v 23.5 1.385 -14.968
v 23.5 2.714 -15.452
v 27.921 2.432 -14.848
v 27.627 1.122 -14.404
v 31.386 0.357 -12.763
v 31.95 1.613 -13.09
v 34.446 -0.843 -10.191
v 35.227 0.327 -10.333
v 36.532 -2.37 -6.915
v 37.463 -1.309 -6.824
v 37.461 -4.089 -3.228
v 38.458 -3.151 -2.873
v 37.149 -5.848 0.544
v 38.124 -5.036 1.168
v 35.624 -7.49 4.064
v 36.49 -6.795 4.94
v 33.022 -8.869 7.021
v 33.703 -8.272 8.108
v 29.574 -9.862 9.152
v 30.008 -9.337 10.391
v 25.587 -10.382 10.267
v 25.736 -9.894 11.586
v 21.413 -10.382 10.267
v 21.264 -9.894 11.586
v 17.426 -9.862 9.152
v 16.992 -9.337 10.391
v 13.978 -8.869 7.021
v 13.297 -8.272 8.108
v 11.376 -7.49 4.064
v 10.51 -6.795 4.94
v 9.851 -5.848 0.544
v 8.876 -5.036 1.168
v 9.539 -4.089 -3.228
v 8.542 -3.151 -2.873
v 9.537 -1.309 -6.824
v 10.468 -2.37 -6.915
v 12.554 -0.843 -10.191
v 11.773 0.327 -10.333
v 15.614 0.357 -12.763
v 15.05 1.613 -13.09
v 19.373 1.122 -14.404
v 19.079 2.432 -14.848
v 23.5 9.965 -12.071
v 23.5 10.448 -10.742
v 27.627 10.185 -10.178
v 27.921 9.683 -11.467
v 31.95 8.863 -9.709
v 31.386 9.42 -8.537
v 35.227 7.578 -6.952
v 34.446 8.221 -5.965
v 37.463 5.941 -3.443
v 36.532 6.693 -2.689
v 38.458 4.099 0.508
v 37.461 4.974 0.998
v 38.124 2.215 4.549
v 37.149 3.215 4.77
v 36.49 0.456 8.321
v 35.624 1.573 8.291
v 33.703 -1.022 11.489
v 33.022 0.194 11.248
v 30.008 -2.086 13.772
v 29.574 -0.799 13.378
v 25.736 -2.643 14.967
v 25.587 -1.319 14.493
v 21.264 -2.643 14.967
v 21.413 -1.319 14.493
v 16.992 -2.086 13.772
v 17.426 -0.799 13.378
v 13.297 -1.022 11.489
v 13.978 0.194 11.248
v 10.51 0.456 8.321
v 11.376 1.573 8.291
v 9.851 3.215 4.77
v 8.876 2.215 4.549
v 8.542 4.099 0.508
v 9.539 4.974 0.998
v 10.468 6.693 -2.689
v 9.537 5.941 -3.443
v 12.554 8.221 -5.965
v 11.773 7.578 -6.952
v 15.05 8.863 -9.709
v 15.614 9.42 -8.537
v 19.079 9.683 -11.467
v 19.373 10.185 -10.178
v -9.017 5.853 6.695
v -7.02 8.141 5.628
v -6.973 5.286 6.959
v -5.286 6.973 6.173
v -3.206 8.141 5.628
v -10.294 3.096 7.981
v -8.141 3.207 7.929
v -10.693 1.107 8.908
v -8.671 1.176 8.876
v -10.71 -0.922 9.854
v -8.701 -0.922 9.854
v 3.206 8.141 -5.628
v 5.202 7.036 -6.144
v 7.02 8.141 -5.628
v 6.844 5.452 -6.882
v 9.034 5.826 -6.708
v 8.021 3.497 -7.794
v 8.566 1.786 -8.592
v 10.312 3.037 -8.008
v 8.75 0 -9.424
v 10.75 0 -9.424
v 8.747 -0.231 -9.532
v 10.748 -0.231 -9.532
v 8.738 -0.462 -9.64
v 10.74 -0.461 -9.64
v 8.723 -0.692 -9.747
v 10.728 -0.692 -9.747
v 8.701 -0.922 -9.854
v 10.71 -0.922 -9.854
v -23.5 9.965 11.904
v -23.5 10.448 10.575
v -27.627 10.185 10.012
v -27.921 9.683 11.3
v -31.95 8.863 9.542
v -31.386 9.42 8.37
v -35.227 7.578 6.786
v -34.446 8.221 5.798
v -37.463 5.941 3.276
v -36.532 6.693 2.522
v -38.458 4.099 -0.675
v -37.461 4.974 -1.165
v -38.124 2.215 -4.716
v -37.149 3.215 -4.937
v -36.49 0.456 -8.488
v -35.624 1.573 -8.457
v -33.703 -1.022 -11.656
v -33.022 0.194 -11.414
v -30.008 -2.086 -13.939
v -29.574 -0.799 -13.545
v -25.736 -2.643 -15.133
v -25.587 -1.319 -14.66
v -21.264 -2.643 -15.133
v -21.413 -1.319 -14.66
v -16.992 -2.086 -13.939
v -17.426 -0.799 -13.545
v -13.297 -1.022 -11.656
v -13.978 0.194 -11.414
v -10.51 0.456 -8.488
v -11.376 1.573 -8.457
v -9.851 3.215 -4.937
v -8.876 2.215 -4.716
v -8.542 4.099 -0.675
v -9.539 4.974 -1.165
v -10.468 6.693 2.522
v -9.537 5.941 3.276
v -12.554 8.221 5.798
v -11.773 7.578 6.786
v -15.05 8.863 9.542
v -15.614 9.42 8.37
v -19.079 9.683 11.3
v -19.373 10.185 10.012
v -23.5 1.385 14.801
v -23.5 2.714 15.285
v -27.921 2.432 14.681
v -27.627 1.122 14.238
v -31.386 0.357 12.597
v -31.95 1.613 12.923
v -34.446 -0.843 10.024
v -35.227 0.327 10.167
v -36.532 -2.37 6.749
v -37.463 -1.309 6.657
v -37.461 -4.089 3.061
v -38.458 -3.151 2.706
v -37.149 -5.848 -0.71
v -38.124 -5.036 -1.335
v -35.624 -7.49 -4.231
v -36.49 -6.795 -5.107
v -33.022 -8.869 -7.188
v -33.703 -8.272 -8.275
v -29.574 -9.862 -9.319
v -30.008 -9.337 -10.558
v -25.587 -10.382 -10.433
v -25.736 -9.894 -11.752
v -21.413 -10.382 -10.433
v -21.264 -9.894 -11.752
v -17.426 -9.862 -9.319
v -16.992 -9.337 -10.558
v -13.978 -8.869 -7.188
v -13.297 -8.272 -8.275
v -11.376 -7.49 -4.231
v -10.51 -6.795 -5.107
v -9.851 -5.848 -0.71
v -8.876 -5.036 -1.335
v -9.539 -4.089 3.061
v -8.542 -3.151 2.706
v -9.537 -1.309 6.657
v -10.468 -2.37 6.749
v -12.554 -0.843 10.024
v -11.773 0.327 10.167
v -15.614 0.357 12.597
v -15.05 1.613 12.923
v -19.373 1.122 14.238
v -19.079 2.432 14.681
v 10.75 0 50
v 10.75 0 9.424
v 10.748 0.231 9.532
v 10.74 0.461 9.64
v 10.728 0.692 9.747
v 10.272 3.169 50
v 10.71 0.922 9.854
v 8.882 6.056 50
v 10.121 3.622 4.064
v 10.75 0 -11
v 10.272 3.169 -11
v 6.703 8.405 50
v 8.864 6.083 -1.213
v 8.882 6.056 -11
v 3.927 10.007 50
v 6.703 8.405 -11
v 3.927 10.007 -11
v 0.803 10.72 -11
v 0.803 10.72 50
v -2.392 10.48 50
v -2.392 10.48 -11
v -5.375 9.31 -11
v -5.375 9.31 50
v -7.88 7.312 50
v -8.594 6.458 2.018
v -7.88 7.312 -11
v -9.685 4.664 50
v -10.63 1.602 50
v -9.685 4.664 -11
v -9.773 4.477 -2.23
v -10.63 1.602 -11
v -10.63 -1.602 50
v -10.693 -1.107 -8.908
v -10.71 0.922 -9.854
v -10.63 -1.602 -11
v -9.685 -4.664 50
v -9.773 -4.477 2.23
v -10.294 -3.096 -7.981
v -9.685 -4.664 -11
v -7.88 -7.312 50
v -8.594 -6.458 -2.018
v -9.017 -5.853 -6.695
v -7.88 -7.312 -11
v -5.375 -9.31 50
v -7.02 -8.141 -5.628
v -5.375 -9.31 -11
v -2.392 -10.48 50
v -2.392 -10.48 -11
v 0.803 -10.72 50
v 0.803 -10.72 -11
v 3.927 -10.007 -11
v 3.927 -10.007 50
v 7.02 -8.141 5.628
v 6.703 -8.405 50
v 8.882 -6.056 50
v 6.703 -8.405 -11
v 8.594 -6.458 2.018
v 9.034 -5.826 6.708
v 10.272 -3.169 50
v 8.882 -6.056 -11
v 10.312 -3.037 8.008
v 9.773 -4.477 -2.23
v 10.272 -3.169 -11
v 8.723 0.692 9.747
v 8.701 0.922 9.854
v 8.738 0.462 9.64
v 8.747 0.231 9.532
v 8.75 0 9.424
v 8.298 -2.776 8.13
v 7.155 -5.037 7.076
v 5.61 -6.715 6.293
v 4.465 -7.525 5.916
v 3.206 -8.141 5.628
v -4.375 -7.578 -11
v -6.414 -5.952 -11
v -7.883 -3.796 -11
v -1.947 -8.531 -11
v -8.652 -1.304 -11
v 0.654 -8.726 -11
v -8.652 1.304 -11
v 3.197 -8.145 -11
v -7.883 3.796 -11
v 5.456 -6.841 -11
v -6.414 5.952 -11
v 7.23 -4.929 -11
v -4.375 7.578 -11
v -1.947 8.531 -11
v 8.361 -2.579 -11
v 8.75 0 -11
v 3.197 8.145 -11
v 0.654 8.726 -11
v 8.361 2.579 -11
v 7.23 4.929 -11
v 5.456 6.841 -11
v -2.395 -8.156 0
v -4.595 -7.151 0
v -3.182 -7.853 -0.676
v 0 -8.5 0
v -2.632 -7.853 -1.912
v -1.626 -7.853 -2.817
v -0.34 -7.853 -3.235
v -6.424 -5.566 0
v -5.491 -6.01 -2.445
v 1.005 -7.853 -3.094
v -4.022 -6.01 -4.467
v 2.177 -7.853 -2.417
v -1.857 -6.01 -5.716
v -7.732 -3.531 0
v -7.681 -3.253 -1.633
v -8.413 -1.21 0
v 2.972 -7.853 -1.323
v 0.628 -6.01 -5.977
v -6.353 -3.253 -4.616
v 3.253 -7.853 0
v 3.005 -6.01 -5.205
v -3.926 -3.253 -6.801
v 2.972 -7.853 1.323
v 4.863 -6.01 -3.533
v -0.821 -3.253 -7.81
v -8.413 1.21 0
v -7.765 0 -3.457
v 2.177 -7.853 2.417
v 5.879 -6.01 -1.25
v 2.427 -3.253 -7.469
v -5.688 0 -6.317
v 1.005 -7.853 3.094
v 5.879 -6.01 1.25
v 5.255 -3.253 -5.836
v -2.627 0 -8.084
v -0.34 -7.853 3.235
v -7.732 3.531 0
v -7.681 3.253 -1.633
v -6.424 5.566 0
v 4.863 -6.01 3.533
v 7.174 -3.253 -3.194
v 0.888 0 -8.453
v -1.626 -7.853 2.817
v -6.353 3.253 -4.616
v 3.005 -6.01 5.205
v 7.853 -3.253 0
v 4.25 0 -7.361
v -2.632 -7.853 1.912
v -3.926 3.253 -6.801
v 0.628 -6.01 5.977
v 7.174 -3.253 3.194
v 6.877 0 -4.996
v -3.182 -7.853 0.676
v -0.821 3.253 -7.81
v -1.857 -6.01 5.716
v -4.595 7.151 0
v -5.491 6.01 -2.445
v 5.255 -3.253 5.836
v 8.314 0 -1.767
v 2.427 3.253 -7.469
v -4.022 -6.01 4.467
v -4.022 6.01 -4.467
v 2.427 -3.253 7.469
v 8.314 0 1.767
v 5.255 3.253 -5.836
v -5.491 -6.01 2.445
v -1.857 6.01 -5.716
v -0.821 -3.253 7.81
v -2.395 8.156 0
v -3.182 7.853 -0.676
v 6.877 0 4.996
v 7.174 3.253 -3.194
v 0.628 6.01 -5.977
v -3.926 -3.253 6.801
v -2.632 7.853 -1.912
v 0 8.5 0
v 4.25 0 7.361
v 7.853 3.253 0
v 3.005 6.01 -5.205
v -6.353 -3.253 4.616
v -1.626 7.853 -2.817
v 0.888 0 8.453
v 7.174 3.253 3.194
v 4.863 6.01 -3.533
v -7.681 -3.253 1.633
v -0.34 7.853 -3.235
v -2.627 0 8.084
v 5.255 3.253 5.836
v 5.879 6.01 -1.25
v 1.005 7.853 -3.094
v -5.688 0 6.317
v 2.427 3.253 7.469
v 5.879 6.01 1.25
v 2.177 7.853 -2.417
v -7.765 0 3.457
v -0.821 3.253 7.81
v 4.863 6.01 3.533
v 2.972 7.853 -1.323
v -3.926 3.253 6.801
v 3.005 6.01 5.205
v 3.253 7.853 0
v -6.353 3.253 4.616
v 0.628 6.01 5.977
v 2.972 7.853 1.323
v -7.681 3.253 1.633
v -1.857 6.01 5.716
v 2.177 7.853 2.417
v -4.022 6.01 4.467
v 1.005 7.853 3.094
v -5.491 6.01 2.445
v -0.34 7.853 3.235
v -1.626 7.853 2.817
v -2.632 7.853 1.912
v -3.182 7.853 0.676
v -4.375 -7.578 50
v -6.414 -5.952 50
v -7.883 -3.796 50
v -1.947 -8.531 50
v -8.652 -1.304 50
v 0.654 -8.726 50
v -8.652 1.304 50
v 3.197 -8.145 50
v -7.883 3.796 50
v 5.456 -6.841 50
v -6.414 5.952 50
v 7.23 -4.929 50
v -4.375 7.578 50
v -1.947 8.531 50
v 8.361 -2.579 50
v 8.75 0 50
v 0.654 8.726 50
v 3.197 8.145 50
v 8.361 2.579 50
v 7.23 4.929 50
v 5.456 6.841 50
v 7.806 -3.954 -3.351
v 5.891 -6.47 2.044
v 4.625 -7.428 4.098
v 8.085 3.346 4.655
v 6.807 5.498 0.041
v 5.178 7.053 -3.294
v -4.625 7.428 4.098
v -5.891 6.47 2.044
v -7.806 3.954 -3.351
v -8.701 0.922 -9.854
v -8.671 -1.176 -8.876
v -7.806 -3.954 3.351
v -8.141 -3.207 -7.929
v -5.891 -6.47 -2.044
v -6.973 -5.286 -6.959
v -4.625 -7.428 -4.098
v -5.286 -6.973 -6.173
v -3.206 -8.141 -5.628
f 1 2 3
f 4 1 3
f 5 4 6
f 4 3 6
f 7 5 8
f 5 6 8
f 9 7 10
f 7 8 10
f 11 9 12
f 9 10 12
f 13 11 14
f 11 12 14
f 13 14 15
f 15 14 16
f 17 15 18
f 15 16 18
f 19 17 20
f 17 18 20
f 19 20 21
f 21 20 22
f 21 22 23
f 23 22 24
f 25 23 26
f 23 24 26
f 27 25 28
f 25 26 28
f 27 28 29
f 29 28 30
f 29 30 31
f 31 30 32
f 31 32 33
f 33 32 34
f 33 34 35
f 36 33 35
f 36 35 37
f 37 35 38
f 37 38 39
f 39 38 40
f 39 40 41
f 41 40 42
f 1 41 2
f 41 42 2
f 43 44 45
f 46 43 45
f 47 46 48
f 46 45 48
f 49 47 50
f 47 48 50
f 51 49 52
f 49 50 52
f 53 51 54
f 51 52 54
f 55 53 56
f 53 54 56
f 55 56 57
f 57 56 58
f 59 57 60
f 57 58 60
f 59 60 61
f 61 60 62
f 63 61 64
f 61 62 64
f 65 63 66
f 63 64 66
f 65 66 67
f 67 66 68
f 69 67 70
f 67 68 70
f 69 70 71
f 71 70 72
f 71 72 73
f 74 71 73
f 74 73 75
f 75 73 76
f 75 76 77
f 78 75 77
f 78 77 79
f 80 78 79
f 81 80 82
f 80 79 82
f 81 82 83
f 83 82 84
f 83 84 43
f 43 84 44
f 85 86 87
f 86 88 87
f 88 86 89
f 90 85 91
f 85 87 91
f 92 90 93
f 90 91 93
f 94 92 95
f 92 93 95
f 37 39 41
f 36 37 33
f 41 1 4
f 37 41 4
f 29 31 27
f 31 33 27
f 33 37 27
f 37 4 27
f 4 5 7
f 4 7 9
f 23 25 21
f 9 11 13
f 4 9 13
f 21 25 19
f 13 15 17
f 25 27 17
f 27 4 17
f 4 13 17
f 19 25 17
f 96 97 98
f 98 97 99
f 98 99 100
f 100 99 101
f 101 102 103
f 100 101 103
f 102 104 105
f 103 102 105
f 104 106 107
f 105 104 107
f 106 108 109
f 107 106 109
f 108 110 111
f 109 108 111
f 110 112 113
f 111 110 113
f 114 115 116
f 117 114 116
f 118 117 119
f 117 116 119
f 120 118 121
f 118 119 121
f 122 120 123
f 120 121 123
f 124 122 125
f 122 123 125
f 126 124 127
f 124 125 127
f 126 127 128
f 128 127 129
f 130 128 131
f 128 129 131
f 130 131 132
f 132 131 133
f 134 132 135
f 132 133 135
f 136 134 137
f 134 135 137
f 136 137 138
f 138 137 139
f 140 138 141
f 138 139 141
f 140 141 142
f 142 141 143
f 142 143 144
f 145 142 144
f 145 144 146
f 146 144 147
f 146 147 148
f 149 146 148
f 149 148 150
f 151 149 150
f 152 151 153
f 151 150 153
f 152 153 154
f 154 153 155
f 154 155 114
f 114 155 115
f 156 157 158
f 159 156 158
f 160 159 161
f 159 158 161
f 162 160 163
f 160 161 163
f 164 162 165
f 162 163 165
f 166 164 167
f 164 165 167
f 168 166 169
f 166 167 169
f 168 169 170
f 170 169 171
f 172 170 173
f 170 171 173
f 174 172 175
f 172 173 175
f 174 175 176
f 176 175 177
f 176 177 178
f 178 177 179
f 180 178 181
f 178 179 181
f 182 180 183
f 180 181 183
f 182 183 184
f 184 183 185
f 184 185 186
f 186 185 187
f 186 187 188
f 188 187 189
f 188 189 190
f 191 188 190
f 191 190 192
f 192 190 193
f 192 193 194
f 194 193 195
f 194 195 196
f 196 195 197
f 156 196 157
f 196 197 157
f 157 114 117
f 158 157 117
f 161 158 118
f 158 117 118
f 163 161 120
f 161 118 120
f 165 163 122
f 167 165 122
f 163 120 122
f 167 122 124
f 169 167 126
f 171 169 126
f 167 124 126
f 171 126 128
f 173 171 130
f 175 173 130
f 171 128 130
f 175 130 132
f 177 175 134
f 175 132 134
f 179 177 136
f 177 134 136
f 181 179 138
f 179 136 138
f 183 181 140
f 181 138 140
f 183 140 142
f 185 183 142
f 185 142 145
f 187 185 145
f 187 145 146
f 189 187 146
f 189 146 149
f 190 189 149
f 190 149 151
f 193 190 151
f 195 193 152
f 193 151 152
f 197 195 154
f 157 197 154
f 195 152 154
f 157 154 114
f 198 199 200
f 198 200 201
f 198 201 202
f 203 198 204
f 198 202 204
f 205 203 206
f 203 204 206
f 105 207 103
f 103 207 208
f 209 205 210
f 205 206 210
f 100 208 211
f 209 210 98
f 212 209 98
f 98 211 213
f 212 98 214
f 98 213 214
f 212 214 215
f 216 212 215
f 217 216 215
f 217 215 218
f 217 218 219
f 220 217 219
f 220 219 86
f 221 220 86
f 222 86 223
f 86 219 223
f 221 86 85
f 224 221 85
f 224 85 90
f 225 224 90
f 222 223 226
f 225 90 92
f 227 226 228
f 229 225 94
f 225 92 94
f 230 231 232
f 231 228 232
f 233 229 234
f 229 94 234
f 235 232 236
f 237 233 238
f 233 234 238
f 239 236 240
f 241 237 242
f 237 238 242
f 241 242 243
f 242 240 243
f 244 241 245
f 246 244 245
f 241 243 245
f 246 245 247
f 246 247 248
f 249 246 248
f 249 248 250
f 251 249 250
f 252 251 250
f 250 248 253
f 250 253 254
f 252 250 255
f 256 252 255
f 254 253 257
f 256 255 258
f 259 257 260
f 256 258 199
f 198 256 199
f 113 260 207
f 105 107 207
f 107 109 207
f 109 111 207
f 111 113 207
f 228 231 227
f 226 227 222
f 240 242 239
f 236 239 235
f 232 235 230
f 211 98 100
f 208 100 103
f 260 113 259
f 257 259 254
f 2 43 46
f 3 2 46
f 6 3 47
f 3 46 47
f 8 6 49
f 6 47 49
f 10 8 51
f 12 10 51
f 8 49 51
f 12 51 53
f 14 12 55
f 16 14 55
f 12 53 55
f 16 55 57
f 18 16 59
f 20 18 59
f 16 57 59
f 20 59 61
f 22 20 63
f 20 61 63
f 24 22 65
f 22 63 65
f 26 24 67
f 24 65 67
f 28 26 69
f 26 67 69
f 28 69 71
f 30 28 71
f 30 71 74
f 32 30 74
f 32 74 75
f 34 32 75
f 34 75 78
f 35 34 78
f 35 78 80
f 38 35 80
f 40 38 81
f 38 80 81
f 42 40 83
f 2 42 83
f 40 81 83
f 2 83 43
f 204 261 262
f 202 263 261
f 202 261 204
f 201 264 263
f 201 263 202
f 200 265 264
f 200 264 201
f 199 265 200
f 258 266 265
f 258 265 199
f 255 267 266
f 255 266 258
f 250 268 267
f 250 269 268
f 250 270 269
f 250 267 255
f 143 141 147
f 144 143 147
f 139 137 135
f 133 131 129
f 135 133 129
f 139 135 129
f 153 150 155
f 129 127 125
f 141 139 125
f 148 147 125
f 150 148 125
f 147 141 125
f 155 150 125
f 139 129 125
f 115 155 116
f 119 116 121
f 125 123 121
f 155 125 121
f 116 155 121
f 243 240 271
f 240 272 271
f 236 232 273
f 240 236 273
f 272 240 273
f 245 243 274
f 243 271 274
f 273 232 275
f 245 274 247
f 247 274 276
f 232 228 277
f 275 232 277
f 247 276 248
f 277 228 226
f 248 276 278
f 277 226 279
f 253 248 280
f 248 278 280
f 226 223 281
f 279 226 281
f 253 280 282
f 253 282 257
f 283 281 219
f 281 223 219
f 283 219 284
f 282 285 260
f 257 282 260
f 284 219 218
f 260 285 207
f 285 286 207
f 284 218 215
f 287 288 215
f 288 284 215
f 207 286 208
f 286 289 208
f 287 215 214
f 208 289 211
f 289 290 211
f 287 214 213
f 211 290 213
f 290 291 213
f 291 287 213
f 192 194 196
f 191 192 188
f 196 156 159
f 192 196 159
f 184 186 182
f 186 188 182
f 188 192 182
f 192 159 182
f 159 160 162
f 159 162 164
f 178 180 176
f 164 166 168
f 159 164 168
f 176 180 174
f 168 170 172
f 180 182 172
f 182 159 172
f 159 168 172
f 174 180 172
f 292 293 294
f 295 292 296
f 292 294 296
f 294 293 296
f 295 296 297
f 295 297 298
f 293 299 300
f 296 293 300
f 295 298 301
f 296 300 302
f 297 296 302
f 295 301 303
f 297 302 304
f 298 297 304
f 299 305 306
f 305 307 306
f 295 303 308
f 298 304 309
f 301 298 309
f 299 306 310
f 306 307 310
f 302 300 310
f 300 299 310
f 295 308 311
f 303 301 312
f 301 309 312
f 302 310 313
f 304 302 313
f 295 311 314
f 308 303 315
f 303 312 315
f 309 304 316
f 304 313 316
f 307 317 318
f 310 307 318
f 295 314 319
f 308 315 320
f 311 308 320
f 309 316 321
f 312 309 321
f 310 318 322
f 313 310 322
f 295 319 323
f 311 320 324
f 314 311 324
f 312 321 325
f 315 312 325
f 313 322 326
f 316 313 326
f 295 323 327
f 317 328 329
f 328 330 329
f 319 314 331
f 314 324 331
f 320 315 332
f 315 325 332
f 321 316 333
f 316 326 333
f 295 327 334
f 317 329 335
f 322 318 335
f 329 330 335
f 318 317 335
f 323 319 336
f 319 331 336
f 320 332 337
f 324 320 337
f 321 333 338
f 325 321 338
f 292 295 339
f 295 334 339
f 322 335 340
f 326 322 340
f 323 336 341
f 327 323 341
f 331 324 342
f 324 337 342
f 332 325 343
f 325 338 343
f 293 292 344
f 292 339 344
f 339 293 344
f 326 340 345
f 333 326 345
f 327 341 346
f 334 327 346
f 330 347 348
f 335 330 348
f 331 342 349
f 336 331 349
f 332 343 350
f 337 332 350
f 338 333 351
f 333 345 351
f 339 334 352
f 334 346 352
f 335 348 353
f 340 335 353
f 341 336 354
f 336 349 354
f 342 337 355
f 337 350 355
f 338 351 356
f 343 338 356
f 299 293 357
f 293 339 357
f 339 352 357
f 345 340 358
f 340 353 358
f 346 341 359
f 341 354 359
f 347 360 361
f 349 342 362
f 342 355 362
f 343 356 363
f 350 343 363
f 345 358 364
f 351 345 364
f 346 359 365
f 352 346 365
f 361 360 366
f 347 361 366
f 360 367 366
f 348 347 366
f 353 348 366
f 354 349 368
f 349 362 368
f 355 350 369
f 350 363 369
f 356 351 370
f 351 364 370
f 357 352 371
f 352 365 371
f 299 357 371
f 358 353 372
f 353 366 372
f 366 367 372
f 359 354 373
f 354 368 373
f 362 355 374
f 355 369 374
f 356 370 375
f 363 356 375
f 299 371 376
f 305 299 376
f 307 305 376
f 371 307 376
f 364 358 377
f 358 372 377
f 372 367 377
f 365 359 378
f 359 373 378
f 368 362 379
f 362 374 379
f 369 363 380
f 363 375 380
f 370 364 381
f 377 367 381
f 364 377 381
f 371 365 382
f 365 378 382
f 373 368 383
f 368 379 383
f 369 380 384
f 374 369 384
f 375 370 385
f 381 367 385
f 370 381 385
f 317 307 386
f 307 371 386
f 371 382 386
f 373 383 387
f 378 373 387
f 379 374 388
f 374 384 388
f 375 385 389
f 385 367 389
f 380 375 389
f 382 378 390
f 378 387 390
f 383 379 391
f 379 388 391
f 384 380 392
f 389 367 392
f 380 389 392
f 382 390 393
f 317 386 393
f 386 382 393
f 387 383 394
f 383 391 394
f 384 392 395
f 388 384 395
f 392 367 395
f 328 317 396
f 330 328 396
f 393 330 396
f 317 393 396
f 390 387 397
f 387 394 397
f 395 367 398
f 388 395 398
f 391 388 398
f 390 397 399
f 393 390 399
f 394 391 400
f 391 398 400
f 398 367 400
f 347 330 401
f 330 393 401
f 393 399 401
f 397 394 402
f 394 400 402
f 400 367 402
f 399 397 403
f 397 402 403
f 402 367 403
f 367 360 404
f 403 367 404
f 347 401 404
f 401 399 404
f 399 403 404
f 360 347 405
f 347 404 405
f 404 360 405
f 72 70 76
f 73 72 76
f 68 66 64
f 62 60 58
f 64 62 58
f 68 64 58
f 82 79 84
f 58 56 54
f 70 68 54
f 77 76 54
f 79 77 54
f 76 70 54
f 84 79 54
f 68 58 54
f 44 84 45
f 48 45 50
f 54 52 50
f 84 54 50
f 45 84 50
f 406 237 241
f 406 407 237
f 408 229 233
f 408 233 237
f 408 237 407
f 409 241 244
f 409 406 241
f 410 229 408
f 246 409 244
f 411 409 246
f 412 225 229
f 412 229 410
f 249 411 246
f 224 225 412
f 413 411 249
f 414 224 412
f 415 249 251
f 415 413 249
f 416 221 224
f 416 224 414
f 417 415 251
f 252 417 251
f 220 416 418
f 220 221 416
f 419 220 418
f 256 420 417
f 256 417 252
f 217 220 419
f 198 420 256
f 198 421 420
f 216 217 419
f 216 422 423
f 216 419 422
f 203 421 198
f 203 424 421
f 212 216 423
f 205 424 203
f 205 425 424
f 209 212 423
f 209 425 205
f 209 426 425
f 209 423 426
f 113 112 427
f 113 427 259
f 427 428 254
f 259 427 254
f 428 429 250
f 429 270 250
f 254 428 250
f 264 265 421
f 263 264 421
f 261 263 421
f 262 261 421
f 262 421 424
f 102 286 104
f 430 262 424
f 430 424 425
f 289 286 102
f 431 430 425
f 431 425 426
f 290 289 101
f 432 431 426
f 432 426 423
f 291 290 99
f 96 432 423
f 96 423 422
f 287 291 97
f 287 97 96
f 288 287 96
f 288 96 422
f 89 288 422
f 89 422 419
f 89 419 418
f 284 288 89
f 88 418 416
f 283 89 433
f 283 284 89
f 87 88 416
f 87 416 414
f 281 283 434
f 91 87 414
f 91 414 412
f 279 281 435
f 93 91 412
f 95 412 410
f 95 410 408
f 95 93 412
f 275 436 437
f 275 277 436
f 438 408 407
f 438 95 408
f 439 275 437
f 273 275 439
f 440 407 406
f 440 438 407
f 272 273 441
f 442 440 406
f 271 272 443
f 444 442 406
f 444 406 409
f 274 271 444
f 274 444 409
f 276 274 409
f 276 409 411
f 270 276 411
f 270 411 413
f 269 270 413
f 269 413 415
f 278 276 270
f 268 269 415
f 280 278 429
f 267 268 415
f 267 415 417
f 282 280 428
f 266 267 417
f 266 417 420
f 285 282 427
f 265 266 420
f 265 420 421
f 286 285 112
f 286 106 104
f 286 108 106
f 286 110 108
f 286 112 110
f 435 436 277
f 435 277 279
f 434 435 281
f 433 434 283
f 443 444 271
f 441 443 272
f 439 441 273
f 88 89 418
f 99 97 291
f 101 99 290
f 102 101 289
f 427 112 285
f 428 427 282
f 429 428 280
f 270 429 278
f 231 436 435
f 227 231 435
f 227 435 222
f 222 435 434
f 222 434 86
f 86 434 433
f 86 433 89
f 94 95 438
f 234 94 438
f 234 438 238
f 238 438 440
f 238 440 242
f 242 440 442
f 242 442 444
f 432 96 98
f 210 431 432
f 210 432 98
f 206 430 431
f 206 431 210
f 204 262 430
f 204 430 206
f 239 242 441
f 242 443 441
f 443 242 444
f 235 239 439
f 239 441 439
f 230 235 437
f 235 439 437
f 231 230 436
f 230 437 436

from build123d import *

# Parameters (mm, degrees)
CHAMFER1_SIZE            = 1
CIRPATTERN1_COUNT        = 2
BOSS_EXTRUDE2_DEPTH      = 50
BOSS_EXTRUDE2_DEPTH_BACK = 11
SKETCH9_R                = 10.75
SKETCH9_R_2              = 8.75
CUT_EXTRUDE1_DEPTH       = 11
CIRPATTERN2_START        = -8.541476068
CIRPATTERN2_OUTLINE_W    = 10
CIRPATTERN2_OUTLINE_H    = 10
CIRPATTERN2_DEPTH        = 17.082952136


# Read off the part's stored shape, not the designer's step: CirPattern2
with BuildPart() as part:
    # Sketch4 → Revolve4 (revolve)
    with BuildSketch(Plane.XY):
        with BuildLine():
            Line((0, 8.5), (0, -8.5))
            ThreePointArc((0, -8.5), (-8.5, 0), (0, 8.5))
        make_face()
    revolve(axis=Axis((0, 8.5, 0), (0, -1, 0)))


with BuildPart() as body_2:
    # Sketch7 → Revolve5 (revolve)
    with BuildSketch(Plane.ZY.offset(23.5), mode=Mode.PRIVATE) as revolve5_sk:
        Polygon((2.113091309, -4.531538935), (-11.481525497, -10.870812861), (-15.707708114, -1.807734991), (-2.113091309, 4.531538935), align=None)
    revolve(revolve5_sk.sketch.rotate(Axis((-23.5, 4.531538935, -2.113091309), (-2.7755575615628933e-15, -0.9063077870366493, 0.42261826174070116)), 180), axis=Axis((-23.5, 4.531538935, -2.113091309), (-2.7755575615628933e-15, -0.9063077870366493, 0.42261826174070116)))

    # Chamfer1
    chamfer1_edges = [body_2.edges().sort_by_distance(p)[0] for p in [
        (-23.5, -1.807734991, -15.707708114),
        (-23.5, -10.870812861, -11.481525497),
    ]]
    chamfer(chamfer1_edges, length=CHAMFER1_SIZE)


with BuildPart() as cirpattern1_1:
    # CirPattern1: pattern copy
    add(body_2.part.rotate(Axis((0, 0.119054888, -0.083338421), (0, 1, 0)), 1 * 360 / CIRPATTERN1_COUNT))


with BuildPart() as body_4:
    # Sketch9 → Boss-Extrude2 (new, two sides: drawn at the far end of the back side and taken through both)
    with BuildSketch(Plane.XY.offset(-BOSS_EXTRUDE2_DEPTH_BACK)):
        Circle(SKETCH9_R)
        Circle(SKETCH9_R_2, mode=Mode.SUBTRACT)
    extrude(amount=BOSS_EXTRUDE2_DEPTH + BOSS_EXTRUDE2_DEPTH_BACK)

    # Sketch11 → Cut-Extrude1 (cut)
    with BuildSketch(Plane(origin=(0, 0, 0), x_dir=(0, 0, -1), z_dir=(1, 0, 0))):
        Polygon((9.854297582, 0.921755167), (-5.628114964, 8.141322704), (-9.854297582, -0.921755167), (5.628114964, -8.141322704), align=None)
    extrude(amount=-CUT_EXTRUDE1_DEPTH, mode=Mode.SUBTRACT)

    # CirPattern2 outline → CirPattern2 (cut)
    with BuildSketch(Plane(origin=(0, 0, 0), x_dir=(1, 0, 0), z_dir=(0, 0.4226182617407011, -0.9063077870366493)).offset(CIRPATTERN2_START)):
        with Locations((7, 0)):
            Rectangle(CIRPATTERN2_OUTLINE_W, CIRPATTERN2_OUTLINE_H)
    extrude(amount=CIRPATTERN2_DEPTH, mode=Mode.SUBTRACT)


solid = Compound([part.part, body_2.part, cirpattern1_1.part, body_4.part])
